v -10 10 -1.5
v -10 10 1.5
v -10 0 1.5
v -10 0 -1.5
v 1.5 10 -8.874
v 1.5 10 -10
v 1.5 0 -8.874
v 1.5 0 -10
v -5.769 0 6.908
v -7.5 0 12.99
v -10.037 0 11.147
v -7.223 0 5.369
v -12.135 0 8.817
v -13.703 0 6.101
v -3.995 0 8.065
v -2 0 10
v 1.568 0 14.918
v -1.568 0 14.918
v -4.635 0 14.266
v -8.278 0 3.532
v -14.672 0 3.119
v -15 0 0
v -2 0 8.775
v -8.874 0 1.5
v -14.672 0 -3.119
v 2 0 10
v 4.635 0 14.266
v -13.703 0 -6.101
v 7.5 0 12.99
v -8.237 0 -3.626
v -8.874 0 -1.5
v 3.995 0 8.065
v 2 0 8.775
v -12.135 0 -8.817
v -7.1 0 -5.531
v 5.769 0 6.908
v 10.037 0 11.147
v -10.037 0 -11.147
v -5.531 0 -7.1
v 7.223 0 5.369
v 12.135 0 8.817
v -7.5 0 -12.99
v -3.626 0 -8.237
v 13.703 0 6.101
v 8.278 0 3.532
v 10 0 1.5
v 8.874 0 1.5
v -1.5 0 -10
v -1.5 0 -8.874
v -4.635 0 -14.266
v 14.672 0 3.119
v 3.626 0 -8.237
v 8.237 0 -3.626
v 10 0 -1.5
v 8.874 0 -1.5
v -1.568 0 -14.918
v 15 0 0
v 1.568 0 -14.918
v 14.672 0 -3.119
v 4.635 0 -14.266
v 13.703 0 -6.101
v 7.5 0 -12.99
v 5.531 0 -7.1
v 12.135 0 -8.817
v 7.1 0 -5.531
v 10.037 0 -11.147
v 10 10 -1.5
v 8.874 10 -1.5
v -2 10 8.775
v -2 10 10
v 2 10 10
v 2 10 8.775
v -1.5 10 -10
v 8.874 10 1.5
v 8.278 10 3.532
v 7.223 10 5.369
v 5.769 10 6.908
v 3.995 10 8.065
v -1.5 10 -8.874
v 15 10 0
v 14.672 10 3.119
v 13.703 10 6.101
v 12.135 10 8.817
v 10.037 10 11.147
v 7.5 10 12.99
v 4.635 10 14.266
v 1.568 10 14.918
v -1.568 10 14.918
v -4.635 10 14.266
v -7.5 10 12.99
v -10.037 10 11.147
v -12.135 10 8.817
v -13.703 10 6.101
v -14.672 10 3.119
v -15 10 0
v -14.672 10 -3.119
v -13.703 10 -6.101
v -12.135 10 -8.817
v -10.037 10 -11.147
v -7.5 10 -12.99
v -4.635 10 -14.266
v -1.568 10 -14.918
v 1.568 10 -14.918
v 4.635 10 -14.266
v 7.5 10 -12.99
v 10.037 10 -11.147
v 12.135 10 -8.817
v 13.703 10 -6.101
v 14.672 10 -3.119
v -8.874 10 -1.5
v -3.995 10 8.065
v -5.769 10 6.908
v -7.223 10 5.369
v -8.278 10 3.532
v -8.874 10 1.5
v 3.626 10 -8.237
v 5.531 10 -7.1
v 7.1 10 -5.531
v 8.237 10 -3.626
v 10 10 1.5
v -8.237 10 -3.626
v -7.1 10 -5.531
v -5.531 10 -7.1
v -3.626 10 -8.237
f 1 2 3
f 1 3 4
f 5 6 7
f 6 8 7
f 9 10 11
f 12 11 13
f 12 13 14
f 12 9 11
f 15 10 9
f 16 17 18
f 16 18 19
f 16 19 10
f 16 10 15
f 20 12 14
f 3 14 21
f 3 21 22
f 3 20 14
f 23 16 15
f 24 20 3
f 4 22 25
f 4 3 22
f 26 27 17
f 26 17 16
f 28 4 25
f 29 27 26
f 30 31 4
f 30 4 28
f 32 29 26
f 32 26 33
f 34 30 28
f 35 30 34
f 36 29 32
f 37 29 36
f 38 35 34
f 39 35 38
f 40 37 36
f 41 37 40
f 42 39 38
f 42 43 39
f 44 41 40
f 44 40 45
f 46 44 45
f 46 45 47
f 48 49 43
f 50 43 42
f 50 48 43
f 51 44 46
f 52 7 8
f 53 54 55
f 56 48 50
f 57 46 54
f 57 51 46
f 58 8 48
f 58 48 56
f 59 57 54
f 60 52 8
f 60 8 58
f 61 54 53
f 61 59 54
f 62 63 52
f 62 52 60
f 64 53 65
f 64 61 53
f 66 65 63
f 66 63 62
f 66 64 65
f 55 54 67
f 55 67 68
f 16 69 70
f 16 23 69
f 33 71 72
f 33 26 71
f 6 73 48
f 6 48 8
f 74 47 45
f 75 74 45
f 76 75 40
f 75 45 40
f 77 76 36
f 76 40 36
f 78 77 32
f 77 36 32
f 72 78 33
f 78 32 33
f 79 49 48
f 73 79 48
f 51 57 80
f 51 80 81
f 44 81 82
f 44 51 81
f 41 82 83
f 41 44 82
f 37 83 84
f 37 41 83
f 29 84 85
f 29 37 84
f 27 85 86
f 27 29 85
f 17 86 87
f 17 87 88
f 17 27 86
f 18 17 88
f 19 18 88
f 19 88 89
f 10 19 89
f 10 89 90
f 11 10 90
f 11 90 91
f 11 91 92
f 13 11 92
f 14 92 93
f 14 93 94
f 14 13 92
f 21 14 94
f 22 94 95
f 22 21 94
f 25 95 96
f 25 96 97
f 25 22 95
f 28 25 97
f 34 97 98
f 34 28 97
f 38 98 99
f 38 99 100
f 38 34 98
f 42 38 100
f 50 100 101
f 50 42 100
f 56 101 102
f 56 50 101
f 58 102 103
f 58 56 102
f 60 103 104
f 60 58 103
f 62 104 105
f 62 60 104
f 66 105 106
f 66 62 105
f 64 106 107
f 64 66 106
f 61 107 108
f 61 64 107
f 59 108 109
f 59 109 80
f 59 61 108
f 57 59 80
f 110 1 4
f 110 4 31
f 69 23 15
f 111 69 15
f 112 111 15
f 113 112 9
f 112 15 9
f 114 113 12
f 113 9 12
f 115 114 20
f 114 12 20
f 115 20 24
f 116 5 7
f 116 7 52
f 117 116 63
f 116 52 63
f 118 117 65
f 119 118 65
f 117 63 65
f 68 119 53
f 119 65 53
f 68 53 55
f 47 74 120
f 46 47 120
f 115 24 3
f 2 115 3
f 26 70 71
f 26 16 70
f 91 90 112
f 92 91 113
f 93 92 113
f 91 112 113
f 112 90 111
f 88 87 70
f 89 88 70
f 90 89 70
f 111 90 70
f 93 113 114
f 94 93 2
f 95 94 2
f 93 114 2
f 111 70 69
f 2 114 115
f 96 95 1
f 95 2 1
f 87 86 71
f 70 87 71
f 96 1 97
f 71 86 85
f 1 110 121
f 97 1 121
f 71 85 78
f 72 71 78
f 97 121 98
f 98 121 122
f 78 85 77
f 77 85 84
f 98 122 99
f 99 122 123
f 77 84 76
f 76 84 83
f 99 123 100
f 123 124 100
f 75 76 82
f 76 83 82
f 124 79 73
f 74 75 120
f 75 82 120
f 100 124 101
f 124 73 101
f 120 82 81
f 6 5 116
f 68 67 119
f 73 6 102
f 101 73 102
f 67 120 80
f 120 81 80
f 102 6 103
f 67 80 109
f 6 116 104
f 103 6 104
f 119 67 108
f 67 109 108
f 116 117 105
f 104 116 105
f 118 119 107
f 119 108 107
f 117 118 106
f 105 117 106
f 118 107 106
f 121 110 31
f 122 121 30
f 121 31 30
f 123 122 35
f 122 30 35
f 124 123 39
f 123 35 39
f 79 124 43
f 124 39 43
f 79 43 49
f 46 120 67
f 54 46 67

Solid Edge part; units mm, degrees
sketch "Sketch1" plane through (0, 0, 0) normal (0, -1, 0) x (1, 0, 0)
  circle A0 centre (0, 0) radius 15
  circle A1 centre (0, 0) radius 9
  dimension "D1" = 30
  dimension "D2" = 18
extrude "Protrusion1" add sketch "Sketch1" against normal blind 10
sketch "Sketch2" plane through (0, 0, 0) normal (0, -1, 0) x (1, 0, 0)
  line L0 (-2, 8.775) -> (-2, 10)
  line L1 (-2, 10) -> (2, 10)
  line L2 (2, 10) -> (2, 8.775)
  arc A0 (2, 8.775) -> (8.8741, 1.5) centre (0, 0) cw
  line L3 (8.8741, 1.5) -> (10, 1.5)
  line L4 (10, 1.5) -> (10, -1.5)
  line L5 (10, -1.5) -> (8.8741, -1.5)
  line L6 (1.5, -10) -> (1.5, -8.8741)
  line L7 (-1.5, -10) -> (1.5, -10)
  line L8 (-1.5, -8.8741) -> (-1.5, -10)
  arc A1 (-1.5, -8.8741) -> (-8.8741, -1.5) centre (0, 0) cw
  line L9 (-10, -1.5) -> (-8.8741, -1.5)
  line L10 (-10, 1.5) -> (-10, -1.5)
  line L11 (-8.8741, 1.5) -> (-10, 1.5)
  arc A2 (-8.8741, 1.5) -> (-2, 8.775) centre (0, 0) cw
  line L12 (8.8741, -1.5) -> (1.5, -8.8741)
  dimension "D1" = 10
  dimension "D2" = 10
  dimension "D3" = 4
  dimension "D4" = 3
  dimension "D5" = 3
  dimension "D6" = 3
  dimension "D7" = 10
  dimension "D8" = 10
extrude "Extrusionsausschnitt_1" cut sketch "Sketch2" against normal blind 517
